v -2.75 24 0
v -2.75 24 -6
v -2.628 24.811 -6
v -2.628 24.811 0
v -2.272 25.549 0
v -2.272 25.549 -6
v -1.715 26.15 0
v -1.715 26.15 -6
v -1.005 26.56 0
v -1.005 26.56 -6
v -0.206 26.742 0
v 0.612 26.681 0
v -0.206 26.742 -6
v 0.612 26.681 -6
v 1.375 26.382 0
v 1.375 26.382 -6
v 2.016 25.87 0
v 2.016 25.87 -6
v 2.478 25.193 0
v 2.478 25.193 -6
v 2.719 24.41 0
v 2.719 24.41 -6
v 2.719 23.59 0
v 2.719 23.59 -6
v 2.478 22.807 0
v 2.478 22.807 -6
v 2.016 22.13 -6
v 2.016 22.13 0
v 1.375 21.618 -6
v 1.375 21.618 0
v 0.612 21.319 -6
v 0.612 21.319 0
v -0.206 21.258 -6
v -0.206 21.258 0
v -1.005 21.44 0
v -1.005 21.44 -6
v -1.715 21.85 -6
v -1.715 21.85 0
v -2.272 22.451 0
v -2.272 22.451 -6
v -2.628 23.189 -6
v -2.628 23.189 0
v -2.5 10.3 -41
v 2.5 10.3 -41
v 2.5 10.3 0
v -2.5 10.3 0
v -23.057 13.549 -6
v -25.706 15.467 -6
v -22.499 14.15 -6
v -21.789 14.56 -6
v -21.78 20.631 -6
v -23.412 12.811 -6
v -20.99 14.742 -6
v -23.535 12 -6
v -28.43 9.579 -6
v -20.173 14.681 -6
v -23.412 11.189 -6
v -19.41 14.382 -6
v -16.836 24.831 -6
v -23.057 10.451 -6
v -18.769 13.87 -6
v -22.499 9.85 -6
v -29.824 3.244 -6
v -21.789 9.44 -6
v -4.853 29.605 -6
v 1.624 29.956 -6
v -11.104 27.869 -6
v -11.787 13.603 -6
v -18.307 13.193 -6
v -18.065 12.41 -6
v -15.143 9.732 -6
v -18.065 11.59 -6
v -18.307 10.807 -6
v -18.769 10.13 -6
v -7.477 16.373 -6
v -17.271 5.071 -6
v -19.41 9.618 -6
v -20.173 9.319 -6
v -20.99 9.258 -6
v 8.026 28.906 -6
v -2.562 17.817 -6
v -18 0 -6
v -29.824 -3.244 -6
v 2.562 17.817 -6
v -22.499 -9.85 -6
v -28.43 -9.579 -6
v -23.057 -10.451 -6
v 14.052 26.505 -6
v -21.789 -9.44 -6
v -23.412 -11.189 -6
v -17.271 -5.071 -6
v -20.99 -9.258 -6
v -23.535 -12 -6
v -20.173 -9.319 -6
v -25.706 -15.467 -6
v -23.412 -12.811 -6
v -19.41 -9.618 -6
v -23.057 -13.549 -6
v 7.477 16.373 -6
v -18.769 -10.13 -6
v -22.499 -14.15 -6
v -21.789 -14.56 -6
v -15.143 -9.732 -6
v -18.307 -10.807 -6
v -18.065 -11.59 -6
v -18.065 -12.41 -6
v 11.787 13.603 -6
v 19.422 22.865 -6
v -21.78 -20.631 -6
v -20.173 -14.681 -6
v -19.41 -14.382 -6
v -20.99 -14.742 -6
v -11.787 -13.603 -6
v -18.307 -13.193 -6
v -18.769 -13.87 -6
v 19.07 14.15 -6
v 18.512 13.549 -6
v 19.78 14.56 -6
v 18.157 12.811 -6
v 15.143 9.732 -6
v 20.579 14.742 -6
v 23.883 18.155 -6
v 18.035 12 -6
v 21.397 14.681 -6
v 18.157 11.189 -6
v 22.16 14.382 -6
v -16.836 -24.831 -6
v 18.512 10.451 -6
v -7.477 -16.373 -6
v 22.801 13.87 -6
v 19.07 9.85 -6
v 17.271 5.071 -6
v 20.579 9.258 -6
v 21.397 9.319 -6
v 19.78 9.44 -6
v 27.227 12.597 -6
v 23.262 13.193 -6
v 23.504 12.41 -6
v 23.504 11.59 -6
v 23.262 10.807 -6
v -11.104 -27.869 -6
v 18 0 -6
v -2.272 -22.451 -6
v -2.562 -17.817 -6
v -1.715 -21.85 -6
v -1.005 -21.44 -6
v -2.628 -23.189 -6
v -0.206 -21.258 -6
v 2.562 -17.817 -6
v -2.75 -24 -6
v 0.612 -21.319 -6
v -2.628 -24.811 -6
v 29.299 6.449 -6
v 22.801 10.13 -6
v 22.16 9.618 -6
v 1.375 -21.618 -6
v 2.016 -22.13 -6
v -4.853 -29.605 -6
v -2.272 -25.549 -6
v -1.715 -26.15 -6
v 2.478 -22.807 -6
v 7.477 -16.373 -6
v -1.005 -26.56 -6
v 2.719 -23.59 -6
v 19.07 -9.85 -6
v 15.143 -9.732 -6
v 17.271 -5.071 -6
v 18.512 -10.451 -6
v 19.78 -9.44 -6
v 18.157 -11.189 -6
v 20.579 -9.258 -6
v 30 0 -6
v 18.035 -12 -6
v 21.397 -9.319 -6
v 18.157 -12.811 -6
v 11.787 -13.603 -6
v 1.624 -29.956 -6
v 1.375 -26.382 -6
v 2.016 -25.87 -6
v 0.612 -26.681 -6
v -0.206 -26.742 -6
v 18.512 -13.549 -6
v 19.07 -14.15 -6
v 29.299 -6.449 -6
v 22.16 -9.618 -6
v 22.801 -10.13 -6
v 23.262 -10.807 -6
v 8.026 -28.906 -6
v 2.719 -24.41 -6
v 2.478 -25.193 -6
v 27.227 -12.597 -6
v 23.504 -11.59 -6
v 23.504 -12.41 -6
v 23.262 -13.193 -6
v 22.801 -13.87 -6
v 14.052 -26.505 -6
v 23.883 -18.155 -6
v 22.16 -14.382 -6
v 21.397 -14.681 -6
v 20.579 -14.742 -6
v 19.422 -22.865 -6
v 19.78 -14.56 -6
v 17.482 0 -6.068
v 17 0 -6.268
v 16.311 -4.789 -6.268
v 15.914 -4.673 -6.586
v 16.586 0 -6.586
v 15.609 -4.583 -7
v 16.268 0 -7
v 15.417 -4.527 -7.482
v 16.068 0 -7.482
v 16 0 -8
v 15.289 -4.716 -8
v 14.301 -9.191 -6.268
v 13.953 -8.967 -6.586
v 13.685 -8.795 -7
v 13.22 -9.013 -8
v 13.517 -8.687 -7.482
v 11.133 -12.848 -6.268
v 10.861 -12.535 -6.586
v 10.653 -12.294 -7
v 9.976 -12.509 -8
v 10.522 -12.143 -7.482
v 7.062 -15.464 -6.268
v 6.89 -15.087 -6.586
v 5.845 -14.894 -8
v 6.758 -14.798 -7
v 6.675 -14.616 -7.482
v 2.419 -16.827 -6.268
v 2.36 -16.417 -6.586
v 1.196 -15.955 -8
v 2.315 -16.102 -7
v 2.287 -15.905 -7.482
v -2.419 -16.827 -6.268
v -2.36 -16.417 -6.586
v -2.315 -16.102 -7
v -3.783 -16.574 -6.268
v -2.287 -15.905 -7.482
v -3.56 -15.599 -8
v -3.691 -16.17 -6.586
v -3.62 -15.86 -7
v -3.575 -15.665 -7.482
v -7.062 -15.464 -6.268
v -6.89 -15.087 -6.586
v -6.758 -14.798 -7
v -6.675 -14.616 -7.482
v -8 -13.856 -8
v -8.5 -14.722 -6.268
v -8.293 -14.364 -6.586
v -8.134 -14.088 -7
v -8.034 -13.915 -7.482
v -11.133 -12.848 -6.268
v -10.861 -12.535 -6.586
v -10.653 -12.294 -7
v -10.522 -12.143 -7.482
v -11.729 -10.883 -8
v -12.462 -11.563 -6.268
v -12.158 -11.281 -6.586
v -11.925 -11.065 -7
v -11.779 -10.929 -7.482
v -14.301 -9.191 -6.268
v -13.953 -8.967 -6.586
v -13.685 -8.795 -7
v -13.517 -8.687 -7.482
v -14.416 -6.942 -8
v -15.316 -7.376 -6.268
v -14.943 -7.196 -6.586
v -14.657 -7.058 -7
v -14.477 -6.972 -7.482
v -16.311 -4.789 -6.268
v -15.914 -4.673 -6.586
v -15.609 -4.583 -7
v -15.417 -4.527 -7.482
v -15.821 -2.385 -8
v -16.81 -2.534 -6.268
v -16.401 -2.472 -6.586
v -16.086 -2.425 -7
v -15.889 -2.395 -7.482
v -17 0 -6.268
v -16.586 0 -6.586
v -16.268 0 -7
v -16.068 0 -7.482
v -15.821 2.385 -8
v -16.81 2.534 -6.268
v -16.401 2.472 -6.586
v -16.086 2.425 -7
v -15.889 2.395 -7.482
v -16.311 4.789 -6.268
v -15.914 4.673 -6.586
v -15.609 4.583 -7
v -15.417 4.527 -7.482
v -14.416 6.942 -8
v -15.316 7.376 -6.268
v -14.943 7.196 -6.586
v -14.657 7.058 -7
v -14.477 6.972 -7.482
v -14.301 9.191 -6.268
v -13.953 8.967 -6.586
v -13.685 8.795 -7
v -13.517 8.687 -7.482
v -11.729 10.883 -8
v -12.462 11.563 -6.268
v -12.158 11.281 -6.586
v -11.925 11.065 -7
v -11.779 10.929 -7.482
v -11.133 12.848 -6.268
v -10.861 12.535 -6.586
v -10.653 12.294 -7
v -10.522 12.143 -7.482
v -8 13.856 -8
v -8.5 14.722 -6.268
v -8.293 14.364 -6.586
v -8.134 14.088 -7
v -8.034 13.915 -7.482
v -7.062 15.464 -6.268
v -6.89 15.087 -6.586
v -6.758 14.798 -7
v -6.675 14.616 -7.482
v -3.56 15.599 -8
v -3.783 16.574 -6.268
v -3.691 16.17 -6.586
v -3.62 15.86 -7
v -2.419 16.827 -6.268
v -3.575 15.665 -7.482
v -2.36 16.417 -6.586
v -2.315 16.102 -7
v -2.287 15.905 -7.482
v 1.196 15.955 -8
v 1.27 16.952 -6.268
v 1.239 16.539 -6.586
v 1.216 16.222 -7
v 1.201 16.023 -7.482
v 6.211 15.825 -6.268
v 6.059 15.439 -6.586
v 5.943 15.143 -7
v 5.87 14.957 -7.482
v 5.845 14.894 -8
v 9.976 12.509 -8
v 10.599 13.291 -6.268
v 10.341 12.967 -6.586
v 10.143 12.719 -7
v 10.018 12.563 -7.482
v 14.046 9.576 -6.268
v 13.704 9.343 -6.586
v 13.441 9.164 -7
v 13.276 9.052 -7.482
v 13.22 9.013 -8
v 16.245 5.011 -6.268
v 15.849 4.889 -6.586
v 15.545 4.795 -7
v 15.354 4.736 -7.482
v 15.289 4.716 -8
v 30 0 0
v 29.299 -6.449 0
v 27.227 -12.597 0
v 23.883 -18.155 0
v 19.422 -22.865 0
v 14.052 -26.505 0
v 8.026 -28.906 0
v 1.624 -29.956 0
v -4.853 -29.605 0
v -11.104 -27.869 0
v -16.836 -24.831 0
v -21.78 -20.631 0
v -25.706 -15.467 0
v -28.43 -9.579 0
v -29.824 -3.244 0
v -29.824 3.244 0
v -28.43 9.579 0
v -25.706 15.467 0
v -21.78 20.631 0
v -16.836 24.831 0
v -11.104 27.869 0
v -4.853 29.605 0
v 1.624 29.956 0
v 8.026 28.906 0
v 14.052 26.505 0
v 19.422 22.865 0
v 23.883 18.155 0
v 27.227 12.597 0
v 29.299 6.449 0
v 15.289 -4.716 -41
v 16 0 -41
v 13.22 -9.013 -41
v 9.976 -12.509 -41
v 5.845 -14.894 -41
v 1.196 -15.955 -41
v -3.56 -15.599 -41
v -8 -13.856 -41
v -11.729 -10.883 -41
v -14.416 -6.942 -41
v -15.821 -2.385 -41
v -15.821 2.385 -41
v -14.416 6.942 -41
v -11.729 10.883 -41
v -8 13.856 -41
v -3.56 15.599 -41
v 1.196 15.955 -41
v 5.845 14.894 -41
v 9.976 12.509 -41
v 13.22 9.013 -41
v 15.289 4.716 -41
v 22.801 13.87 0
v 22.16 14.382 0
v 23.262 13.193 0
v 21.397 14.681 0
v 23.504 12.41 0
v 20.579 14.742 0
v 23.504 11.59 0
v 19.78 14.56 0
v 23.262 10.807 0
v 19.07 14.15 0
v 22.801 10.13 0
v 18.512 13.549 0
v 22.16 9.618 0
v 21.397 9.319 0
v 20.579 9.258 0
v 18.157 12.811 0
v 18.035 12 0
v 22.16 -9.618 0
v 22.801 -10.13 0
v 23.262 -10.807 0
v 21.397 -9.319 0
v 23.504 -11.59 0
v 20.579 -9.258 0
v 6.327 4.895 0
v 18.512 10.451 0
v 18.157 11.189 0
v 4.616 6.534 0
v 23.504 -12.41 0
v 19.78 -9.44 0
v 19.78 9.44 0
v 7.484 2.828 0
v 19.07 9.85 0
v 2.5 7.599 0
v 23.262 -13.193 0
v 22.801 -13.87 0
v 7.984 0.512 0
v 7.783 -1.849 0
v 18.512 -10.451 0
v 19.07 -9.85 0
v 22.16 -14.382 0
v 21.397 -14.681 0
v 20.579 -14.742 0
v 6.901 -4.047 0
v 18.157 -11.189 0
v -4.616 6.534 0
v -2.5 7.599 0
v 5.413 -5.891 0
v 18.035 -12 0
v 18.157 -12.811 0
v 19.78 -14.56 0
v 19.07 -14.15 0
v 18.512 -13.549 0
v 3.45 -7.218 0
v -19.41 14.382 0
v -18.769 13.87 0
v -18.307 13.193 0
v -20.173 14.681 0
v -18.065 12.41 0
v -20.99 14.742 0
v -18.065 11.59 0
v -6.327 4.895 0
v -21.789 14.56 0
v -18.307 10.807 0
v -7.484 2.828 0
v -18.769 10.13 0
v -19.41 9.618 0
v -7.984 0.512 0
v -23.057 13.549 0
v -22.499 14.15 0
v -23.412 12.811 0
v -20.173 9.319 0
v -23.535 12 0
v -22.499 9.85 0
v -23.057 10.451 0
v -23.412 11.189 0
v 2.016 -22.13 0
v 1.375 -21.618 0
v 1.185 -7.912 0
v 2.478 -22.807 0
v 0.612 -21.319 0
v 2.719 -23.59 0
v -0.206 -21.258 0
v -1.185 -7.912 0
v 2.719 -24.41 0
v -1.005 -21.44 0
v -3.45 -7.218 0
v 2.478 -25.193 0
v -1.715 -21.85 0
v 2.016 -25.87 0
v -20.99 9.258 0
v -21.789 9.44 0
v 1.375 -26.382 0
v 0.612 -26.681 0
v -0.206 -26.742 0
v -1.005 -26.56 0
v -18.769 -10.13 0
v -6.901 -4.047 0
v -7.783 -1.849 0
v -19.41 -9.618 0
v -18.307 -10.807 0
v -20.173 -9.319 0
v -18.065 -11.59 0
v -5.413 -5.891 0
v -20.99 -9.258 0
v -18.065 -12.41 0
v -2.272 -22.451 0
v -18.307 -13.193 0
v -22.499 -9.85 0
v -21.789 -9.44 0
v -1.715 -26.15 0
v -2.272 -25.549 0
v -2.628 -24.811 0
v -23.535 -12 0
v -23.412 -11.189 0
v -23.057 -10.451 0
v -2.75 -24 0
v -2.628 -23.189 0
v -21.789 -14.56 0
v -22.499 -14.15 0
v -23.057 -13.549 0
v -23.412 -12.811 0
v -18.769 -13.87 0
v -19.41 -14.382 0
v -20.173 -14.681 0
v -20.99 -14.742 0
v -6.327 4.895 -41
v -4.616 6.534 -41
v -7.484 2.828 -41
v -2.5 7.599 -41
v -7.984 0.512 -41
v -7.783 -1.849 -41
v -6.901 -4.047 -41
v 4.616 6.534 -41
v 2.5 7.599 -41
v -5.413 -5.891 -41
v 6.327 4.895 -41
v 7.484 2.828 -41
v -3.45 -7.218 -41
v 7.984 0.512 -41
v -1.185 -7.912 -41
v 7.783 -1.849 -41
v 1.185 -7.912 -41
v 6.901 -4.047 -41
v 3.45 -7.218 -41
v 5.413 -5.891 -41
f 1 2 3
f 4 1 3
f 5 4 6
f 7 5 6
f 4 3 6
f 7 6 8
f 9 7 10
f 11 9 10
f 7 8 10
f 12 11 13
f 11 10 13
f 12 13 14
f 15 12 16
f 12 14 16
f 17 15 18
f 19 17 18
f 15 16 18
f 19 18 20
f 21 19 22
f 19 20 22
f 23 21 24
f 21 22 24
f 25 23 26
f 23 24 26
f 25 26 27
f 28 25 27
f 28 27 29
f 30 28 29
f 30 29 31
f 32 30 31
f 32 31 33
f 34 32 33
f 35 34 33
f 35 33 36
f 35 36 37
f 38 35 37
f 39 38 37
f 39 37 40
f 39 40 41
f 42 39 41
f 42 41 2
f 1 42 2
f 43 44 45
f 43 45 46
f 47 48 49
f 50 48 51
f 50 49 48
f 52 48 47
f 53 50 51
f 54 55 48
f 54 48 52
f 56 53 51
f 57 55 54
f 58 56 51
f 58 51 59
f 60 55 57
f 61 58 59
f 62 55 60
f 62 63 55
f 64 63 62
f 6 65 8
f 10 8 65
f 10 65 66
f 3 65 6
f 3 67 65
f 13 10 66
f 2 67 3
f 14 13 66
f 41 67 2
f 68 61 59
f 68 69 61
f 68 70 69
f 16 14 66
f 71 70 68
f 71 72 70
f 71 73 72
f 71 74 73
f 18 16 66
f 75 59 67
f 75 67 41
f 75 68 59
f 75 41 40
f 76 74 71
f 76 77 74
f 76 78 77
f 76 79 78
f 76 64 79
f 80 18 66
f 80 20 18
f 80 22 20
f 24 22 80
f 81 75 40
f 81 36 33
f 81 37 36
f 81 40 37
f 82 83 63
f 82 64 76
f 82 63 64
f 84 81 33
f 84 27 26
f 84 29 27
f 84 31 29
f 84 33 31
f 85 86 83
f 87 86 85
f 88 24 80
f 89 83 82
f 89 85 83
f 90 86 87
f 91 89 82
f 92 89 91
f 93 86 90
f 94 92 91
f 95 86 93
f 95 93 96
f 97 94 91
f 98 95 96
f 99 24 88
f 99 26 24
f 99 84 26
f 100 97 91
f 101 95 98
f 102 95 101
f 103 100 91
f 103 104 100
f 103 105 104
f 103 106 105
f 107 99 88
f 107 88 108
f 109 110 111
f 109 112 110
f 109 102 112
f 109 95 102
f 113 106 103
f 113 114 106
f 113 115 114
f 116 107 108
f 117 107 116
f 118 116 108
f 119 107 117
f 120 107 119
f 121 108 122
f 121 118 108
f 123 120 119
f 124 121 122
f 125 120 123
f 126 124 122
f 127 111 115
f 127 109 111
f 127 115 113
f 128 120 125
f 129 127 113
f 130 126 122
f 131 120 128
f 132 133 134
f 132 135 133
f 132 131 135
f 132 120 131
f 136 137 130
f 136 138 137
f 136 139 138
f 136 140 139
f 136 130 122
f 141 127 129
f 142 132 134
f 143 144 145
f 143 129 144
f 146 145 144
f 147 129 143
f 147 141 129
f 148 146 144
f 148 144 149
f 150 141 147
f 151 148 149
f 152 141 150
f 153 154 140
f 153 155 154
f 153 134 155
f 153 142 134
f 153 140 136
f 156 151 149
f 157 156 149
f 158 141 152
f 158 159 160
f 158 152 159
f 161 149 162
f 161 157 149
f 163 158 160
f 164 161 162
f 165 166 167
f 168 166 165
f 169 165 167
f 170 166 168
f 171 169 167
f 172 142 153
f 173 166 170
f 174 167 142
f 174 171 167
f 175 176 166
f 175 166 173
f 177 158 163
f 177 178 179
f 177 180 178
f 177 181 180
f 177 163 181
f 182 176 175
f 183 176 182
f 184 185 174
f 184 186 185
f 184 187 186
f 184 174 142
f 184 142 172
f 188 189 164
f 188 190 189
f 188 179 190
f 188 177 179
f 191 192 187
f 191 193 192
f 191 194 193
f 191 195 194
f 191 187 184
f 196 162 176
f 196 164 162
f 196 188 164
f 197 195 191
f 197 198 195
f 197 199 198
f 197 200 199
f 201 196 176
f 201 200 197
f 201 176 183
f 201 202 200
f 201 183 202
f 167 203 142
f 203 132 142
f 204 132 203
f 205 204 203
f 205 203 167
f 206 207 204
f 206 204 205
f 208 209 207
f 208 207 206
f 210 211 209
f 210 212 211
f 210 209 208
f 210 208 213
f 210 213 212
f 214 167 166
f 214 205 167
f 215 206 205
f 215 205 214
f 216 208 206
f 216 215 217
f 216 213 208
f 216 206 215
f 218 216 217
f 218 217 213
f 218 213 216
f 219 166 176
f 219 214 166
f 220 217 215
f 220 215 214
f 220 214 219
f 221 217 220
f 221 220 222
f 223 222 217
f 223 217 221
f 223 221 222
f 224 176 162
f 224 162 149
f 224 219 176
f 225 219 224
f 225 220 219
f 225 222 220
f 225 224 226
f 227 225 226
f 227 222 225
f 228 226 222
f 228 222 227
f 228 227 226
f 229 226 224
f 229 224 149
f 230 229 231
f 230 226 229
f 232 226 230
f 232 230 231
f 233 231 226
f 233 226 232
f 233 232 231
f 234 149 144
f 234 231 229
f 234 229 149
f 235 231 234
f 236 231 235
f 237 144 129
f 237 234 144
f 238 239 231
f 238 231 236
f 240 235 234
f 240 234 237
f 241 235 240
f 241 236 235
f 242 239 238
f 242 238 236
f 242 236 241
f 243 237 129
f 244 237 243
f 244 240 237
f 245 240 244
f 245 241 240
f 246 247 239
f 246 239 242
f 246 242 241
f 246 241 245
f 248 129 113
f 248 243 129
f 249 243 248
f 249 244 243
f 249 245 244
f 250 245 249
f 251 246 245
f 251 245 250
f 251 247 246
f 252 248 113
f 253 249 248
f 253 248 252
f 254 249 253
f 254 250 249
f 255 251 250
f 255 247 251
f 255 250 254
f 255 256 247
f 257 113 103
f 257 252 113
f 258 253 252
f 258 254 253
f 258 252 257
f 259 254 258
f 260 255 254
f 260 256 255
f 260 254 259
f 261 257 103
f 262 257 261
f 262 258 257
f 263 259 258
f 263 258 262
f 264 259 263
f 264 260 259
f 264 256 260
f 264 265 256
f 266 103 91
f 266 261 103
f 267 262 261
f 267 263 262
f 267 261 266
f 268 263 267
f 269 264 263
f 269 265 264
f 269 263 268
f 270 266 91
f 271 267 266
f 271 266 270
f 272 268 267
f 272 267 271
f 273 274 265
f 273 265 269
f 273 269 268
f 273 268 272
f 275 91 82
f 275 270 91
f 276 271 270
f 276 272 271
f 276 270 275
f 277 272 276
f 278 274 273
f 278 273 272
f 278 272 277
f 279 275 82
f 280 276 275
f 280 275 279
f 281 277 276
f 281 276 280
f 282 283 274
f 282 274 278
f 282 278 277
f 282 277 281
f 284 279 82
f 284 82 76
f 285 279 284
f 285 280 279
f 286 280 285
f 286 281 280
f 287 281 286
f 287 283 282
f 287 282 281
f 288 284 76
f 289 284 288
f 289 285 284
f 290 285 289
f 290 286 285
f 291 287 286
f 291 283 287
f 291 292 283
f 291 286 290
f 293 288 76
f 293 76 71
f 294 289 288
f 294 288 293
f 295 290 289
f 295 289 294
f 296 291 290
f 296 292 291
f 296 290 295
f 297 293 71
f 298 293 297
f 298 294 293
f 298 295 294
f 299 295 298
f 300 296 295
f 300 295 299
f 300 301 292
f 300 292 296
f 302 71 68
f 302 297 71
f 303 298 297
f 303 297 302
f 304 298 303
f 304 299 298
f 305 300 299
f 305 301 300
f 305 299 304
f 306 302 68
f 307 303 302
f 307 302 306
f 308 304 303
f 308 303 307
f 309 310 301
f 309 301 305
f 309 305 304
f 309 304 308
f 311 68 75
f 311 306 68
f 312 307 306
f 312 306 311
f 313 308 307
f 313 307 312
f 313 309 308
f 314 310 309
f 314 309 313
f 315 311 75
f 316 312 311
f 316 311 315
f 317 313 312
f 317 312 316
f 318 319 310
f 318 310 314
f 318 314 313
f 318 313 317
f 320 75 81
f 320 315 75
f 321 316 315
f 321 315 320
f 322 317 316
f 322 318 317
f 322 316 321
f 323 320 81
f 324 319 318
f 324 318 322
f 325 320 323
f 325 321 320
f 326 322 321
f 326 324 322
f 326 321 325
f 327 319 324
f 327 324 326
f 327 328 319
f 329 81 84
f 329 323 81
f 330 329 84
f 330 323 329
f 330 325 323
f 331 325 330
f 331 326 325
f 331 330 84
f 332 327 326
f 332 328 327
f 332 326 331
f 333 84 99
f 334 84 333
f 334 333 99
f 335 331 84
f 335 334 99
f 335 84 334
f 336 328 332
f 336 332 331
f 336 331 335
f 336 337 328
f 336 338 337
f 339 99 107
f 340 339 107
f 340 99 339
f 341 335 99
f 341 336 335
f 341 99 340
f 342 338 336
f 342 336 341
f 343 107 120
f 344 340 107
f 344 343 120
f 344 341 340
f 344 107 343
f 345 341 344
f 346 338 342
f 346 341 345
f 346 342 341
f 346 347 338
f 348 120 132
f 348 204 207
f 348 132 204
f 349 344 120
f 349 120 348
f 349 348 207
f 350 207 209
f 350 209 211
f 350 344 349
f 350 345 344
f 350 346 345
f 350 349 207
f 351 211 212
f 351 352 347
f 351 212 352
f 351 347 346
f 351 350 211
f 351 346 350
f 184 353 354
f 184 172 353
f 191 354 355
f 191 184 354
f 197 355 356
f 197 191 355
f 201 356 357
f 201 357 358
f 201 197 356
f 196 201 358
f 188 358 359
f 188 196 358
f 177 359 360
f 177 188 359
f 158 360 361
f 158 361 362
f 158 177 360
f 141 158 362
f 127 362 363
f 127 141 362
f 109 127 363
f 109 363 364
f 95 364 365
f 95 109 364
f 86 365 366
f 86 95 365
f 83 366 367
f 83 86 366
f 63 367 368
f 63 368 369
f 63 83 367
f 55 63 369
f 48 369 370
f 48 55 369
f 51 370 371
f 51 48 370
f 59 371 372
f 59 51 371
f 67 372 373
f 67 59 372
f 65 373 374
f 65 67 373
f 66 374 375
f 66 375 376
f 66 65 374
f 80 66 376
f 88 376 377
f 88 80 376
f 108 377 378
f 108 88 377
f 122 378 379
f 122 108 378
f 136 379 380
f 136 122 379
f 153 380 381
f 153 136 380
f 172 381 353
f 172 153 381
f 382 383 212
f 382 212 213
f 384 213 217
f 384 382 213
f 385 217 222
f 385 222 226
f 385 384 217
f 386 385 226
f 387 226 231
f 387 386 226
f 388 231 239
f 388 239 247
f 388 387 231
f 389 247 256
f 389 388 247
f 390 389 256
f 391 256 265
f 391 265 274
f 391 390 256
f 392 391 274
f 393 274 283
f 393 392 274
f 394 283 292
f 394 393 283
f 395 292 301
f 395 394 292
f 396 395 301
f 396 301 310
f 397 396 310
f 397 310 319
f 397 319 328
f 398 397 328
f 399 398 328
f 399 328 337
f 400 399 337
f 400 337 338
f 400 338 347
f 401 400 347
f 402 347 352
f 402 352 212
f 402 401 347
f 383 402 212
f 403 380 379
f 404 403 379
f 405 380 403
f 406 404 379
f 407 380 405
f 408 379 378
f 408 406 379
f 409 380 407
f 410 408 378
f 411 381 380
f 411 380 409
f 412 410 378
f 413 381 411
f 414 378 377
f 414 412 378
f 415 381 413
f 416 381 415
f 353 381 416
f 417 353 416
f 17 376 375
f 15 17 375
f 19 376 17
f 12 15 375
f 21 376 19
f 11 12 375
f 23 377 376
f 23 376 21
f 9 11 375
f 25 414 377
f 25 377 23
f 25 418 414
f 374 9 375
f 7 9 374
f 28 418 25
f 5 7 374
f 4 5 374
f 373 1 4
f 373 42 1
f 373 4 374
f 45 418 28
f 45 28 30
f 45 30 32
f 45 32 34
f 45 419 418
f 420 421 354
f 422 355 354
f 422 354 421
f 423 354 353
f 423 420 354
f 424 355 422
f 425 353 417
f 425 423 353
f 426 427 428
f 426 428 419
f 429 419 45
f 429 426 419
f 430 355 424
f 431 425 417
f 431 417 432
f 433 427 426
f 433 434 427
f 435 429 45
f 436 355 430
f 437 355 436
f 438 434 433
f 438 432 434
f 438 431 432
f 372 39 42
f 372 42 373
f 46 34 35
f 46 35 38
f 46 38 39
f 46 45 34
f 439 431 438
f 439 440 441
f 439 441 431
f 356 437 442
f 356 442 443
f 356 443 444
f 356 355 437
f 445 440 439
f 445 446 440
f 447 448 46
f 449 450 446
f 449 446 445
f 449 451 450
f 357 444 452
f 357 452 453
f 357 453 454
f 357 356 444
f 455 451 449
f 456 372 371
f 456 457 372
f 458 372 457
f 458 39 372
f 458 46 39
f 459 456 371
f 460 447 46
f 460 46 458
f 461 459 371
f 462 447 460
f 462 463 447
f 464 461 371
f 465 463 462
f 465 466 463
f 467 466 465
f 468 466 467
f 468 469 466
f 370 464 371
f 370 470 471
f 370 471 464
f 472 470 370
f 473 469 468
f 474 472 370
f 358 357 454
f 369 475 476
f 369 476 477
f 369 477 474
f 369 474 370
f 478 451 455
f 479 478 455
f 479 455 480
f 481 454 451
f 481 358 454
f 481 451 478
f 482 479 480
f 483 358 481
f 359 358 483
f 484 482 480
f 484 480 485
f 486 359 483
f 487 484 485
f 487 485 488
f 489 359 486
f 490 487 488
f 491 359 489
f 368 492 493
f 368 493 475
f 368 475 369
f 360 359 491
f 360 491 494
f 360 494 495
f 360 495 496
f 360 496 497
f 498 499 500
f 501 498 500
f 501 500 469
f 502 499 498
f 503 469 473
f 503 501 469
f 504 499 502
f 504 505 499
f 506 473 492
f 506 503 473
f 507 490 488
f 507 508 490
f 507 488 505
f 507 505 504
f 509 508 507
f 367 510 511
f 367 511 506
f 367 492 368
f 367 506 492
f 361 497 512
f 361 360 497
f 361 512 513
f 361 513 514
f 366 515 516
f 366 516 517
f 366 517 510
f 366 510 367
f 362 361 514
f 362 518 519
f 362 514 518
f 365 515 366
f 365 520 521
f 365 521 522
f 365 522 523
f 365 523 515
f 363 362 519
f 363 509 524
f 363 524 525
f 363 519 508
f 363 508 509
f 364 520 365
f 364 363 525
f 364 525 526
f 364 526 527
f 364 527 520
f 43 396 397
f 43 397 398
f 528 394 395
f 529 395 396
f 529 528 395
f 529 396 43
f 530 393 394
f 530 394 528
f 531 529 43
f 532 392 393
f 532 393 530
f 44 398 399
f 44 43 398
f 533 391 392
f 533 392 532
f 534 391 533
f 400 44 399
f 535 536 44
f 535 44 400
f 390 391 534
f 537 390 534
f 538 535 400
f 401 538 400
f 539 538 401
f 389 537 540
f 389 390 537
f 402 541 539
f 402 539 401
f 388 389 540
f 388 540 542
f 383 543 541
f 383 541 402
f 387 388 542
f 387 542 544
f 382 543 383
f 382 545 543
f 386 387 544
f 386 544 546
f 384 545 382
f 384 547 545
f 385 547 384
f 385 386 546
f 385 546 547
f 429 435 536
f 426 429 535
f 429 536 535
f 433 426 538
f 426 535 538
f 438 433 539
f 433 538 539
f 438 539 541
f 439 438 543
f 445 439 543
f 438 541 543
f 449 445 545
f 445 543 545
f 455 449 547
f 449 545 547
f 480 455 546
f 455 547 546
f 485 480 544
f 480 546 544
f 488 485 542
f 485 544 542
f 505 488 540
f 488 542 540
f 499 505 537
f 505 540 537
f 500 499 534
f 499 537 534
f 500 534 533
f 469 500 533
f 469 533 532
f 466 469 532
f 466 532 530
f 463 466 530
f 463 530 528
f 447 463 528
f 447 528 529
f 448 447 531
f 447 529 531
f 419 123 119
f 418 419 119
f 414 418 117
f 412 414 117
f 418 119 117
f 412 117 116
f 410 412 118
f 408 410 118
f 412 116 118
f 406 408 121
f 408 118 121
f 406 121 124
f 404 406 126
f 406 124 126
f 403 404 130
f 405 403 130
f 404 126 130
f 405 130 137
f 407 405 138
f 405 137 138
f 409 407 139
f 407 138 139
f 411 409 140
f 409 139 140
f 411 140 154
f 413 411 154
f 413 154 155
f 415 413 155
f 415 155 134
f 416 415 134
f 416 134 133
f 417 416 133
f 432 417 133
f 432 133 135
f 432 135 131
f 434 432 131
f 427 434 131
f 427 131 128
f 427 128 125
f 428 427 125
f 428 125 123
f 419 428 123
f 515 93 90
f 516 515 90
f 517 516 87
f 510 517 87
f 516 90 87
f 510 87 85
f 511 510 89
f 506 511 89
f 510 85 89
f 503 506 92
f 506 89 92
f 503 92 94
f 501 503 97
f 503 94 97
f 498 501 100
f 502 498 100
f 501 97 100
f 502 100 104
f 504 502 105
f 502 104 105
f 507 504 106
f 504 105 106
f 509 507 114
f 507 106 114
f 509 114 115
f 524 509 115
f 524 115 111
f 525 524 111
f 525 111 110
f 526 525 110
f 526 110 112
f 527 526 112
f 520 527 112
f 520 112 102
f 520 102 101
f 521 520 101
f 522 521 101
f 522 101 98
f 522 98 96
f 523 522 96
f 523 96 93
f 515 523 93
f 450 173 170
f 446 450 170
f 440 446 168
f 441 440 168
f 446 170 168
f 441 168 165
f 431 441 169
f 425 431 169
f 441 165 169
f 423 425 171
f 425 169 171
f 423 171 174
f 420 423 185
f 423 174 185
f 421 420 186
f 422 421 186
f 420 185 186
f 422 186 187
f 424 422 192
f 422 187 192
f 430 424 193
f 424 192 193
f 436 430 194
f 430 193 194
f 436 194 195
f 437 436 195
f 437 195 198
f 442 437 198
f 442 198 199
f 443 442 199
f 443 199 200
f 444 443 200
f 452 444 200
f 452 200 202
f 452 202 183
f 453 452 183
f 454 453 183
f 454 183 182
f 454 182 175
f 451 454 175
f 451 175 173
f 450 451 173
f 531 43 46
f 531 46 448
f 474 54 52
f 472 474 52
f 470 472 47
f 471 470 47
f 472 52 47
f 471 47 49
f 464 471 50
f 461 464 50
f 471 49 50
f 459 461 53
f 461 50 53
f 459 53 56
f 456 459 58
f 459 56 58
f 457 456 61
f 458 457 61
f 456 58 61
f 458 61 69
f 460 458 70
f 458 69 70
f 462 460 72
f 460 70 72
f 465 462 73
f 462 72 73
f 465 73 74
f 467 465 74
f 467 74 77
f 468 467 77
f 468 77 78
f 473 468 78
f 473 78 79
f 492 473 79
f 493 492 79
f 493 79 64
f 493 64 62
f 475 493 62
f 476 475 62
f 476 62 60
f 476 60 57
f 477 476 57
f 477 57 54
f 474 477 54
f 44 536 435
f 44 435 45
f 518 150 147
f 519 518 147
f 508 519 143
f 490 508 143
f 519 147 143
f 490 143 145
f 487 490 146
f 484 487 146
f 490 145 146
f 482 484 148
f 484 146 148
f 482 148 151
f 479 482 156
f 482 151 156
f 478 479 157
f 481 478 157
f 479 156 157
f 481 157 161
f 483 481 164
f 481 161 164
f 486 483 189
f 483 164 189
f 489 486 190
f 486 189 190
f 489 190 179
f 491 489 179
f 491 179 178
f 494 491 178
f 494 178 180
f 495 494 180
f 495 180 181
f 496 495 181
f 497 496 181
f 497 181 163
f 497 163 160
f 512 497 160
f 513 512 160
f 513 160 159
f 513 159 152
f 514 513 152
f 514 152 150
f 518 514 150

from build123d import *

# Parameters (mm, degrees)
CUT_EXTRUDE_1_REACH = 57
SKETCH_2_R          = 2.75
FILLET_1_R          = 2
SKETCH1_R           = 8
CUT_EXTRUDE1_DEPTH  = 60
CUT_EXTRUDE2_DEPTH  = 60


with BuildPart() as part:
    # 草图1 → 旋转1 (revolve)
    with BuildSketch(Plane(origin=(0, 0, 0), x_dir=(0, 0, -1), z_dir=(1, 0, 0)), mode=Mode.PRIVATE) as revolve_1_sk:
        Polygon((0, 0), (0, 30), (6, 30), (6, 16), (41, 16), (41, 0), align=None)
    revolve(revolve_1_sk.sketch.rotate(Axis((0, 0, 0), (0, 0, -1)), 90), axis=Axis((0, 0, 0), (0, 0, -1)))

    # 草图2 → 切除-拉伸1 (cut, up to next)
    with BuildSketch(Plane(origin=(0, 0, -6), x_dir=(-1, 0, 0), z_dir=(0, 0, -1)), mode=Mode.PRIVATE) as cut_extrude_1_sk1:
        with Locations((0, 24)):
            Circle(SKETCH_2_R)
    cut_extrude_1_tool1 = extrude(cut_extrude_1_sk1.sketch, amount=-CUT_EXTRUDE_1_REACH, mode=Mode.PRIVATE) & part.part
    # 草图2 → 切除-拉伸1 (cut, up to next)
    with BuildSketch(Plane(origin=(0, 0, -6), x_dir=(-1, 0, 0), z_dir=(0, 0, -1)), mode=Mode.PRIVATE) as cut_extrude_1_sk2:
        with Locations((20.784609691, 12)):
            Circle(SKETCH_2_R)
    cut_extrude_1_tool2 = extrude(cut_extrude_1_sk2.sketch, amount=-CUT_EXTRUDE_1_REACH, mode=Mode.PRIVATE) & part.part
    # 草图2 → 切除-拉伸1 (cut, up to next)
    with BuildSketch(Plane(origin=(0, 0, -6), x_dir=(-1, 0, 0), z_dir=(0, 0, -1)), mode=Mode.PRIVATE) as cut_extrude_1_sk3:
        with Locations((20.784609691, -12)):
            Circle(SKETCH_2_R)
    cut_extrude_1_tool3 = extrude(cut_extrude_1_sk3.sketch, amount=-CUT_EXTRUDE_1_REACH, mode=Mode.PRIVATE) & part.part
    # 草图2 → 切除-拉伸1 (cut, up to next)
    with BuildSketch(Plane(origin=(0, 0, -6), x_dir=(-1, 0, 0), z_dir=(0, 0, -1)), mode=Mode.PRIVATE) as cut_extrude_1_sk4:
        with Locations((0, -24)):
            Circle(SKETCH_2_R)
    cut_extrude_1_tool4 = extrude(cut_extrude_1_sk4.sketch, amount=-CUT_EXTRUDE_1_REACH, mode=Mode.PRIVATE) & part.part
    # 草图2 → 切除-拉伸1 (cut, up to next)
    with BuildSketch(Plane(origin=(0, 0, -6), x_dir=(-1, 0, 0), z_dir=(0, 0, -1)), mode=Mode.PRIVATE) as cut_extrude_1_sk5:
        with Locations((-20.784609691, -12)):
            Circle(SKETCH_2_R)
    cut_extrude_1_tool5 = extrude(cut_extrude_1_sk5.sketch, amount=-CUT_EXTRUDE_1_REACH, mode=Mode.PRIVATE) & part.part
    # 草图2 → 切除-拉伸1 (cut, up to next)
    with BuildSketch(Plane(origin=(0, 0, -6), x_dir=(-1, 0, 0), z_dir=(0, 0, -1)), mode=Mode.PRIVATE) as cut_extrude_1_sk6:
        with Locations((-20.784609691, 12)):
            Circle(SKETCH_2_R)
    cut_extrude_1_tool6 = extrude(cut_extrude_1_sk6.sketch, amount=-CUT_EXTRUDE_1_REACH, mode=Mode.PRIVATE) & part.part
    add(cut_extrude_1_tool1.solids().sort_by_distance((0, 24, -6))[0], mode=Mode.SUBTRACT)
    add(cut_extrude_1_tool2.solids().sort_by_distance((-20.78461, 12, -6))[0], mode=Mode.SUBTRACT)
    add(cut_extrude_1_tool3.solids().sort_by_distance((-20.78461, -12, -6))[0], mode=Mode.SUBTRACT)
    add(cut_extrude_1_tool4.solids().sort_by_distance((0, -24, -6))[0], mode=Mode.SUBTRACT)
    add(cut_extrude_1_tool5.solids().sort_by_distance((20.78461, -12, -6))[0], mode=Mode.SUBTRACT)
    add(cut_extrude_1_tool6.solids().sort_by_distance((20.78461, 12, -6))[0], mode=Mode.SUBTRACT)

    # 圆角1
    fillet_1_edges = [part.edges().sort_by_distance(p)[0] for p in [
        (-16, 0, -6),
    ]]
    fillet(fillet_1_edges, radius=FILLET_1_R)

    # Sketch1 → Cut-Extrude1 (cut, through all)
    with BuildSketch(Plane(origin=(0, 0, -41), x_dir=(-1, 0, 0), z_dir=(0, 0, -1))):
        Circle(SKETCH1_R)
    extrude(amount=-CUT_EXTRUDE1_DEPTH, mode=Mode.SUBTRACT)

    # Sketch2 → Cut-Extrude2 (cut, through all)
    with BuildSketch(Plane(origin=(0, 0, -41), x_dir=(-1, 0, 0), z_dir=(0, 0, -1))):
        with BuildLine():
            Line((-2.5, 7.599342077), (-2.5, 10.3))
            Line((-2.5, 10.3), (2.5, 10.3))
            Line((2.5, 10.3), (2.5, 7.599342077))
            ThreePointArc((2.5, 7.599342077), (0, 8), (-2.5, 7.599342077))
        make_face()
    extrude(amount=-CUT_EXTRUDE2_DEPTH, mode=Mode.SUBTRACT)


solid = part.part
